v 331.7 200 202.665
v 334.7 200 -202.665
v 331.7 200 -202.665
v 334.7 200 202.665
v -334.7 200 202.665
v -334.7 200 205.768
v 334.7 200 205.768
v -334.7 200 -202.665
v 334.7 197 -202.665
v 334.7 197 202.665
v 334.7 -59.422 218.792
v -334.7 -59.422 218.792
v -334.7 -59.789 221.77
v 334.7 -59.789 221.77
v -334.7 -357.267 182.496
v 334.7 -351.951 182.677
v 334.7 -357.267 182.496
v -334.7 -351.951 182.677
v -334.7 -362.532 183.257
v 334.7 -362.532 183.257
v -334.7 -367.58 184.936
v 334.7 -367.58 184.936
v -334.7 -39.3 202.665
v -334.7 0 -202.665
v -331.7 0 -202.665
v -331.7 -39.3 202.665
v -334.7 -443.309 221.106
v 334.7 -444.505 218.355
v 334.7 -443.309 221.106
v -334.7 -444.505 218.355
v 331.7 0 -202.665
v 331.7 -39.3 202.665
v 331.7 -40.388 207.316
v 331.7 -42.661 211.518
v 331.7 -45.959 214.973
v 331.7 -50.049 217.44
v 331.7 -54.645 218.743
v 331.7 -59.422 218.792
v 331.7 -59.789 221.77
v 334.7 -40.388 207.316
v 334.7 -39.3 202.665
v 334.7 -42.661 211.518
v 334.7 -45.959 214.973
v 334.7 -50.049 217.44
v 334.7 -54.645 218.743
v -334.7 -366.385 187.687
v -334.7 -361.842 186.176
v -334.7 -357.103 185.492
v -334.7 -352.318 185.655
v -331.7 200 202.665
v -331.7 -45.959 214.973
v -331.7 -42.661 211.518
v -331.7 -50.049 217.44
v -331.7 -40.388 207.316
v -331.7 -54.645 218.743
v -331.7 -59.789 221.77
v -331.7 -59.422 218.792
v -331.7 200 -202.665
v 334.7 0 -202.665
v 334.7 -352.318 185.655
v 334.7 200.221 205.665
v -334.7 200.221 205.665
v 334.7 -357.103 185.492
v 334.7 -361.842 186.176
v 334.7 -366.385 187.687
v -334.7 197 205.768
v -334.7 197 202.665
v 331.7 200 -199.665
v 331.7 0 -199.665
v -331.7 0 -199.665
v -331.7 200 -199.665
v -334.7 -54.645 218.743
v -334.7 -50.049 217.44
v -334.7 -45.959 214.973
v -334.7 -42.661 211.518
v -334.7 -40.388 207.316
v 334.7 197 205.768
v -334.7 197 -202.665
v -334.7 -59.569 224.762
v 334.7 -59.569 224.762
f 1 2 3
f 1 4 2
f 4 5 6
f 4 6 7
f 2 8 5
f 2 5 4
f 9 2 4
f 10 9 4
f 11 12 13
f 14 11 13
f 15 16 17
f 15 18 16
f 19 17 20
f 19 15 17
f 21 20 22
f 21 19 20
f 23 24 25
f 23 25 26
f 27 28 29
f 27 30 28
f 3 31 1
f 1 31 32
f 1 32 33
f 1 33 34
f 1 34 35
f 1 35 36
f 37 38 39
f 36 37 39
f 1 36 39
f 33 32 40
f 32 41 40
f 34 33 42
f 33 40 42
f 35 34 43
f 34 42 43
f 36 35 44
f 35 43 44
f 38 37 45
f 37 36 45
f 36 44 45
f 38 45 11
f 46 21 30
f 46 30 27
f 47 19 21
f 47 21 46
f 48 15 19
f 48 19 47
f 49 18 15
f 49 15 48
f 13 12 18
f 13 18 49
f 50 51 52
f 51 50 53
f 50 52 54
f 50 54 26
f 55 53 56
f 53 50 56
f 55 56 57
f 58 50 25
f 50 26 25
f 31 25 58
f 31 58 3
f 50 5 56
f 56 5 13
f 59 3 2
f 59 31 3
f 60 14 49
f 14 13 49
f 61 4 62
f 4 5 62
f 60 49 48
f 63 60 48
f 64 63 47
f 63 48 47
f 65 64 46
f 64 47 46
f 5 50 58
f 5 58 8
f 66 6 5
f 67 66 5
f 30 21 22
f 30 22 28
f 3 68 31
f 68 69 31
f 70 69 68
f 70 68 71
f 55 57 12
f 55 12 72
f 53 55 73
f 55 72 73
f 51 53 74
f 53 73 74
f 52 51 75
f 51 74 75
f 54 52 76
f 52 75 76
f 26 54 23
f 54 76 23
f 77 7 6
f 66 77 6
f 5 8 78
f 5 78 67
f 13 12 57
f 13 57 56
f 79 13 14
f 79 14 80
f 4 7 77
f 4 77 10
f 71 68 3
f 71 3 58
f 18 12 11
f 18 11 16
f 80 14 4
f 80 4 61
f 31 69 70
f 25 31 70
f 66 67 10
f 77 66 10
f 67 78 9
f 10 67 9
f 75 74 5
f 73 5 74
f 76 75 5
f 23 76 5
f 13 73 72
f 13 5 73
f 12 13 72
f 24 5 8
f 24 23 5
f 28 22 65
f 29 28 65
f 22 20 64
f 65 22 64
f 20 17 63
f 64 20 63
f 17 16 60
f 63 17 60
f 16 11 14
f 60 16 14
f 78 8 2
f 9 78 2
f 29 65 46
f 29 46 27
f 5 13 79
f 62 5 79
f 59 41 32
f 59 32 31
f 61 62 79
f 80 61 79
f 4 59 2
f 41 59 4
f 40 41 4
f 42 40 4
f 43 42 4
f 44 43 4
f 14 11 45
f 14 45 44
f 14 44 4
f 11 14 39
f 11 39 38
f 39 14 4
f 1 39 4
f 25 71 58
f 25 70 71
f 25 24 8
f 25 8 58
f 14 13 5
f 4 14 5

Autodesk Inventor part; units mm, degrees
ref_plane "YZ Plane" through (0, 0, 0) normal (1, 0, 0) x (0, 1, 0)
ref_plane "XZ Plane" through (0, 0, 0) normal (0, 1, 0) x (-1, 0, 0)
ref_plane "XY Plane" through (0, 0, 0) normal (0, 0, 1) x (1, 0, 0)
sketch "Sketch1" plane through (0, 0, 0) normal (0, 1, 0) x (-1, 0, 0)
  line L0 (334.7, -202.665) -> (-334.7, -202.665)
  line L1 (-334.7, -202.665) -> (-334.7, 202.665)
  line L2 (-334.7, 202.665) -> (334.7, 202.665)
  line L3 (334.7, 202.665) -> (334.7, -202.665)
  line L4 (337.7, -202.665) -> (-337.7, -202.665) construction
  line L5 (-337.7, -202.665) -> (-337.7, 202.665) construction
  line L6 (-337.7, 202.665) -> (337.7, 202.665) construction
  line L7 (337.7, 202.665) -> (337.7, -202.665) construction
  line L8 (-331.7, 199.665) -> (-331.7, -199.665)
  line L9 (-331.7, -199.665) -> (331.7, -199.665)
  line L10 (331.7, -199.665) -> (331.7, 199.665)
  line L11 (331.7, 199.665) -> (-331.7, 199.665)
  line L12 (331.7, 199.665) -> (331.7, 202.665)
  line L13 (-331.7, 199.665) -> (-331.7, 202.665)
  line L14 (331.7, -199.665) -> (331.7, -202.665)
  line L15 (-331.7, -199.665) -> (-331.7, -202.665)
  point P0 (0, 0)
  point P1 (-334.7, 0)
  point P2 (0, -202.665)
  point P3 (0, -202.665)
  point P4 (-337.7, 0)
  point P5 (331.7, 202.665)
  point P6 (331.7, -202.665)
  point P7 (-331.7, -202.665)
  dimension "d0" = 675.4
  dimension "d1" = 405.33
  dimension "d2" = 3
  dimension "d3" = 3
extrude "Extrusion1" add sketch "Sketch1" along normal blind 200 contours L0 L14 L10 L12 L2 L3
extrude "Extrusion2" add sketch "Sketch1" along normal blind 200 separate body contours L0 L15 L9 L14
sketch "Sketch2" plane through (-334.7, 0, -202.665) normal (-1, 0, 0) x (0, 0, 1)
  line L0 (405.33, 0) -> (0, 0) projected
  line L1 (0, 0) -> (405.33, -39.3)
  line L2 (405.33, 0) -> (405.33, -39.3) construction
  line L3 (405.33, 0) -> (405.33, 200) projected
  arc A0 (421.4573, -59.4215) -> (405.33, -39.3) centre (403.5929, -57.216) ccw
  line L4 (421.4573, -59.4215) -> (413.7818, -121.5922) construction
  line L5 (421.4573, -59.4215) -> (424.4347, -59.7891)
  line L6 (405.33, 200) -> (424.4347, -59.7891)
  point P0 (202.665, 0)
  dimension "d8" = 39.3
  dimension "d9" = 18
  dimension "d10" = 88.5
  dimension "d12" = 3
extrude "Extrusion3" add sketch "Sketch2" against normal up to surface (3 mm away) bodies 1
mirror "Mirror1" about plane through (0, 0, 0) normal (1, 0, 0) of "Extrusion3", "Extrusion1" bodies 1
sketch "Sketch4" plane through (-334.7, 0, -202.665) normal (-1, 0, 0) x (0, 0, 1)
  line L0 (0, 0) -> (405.33, -39.3) projected
  arc A0 (421.4573, -59.4215) -> (405.33, -39.3) centre (403.5929, -57.216) ccw projected
  line L1 (421.4573, -59.4215) -> (424.4347, -59.7891) projected
  line L2 (424.4347, -59.7891) -> (405.33, 200) projected
  line L3 (0, 200) -> (405.33, 200) projected
  line L4 (0, 0) -> (0, 200) projected
  line L5 (424.4347, -59.7891) -> (405.33, 200) projected
  line L6 (405.33, 200) -> (408.33, 200.2206)
  line L7 (408.33, 200.2206) -> (427.4266, -59.569)
  line L8 (424.4347, -59.7891) -> (427.4266, -59.569)
  point P0 (202.665, 0)
  dimension "d15" = 90
  dimension "d16" = 3
  dimension "d17" = 90
  dimension "d19" = 3
extrude "Extrusion4" add sketch "Sketch4" against normal up to surface (669.4 mm away) separate body contours L6 L7 L8 L2
sketch "Sketch5" plane through (0, 200, 0) normal (0, 1, 0) x (1, 0, 0)
  line L0 (-334.7, 202.665) -> (-334.7, -202.665) projected
  line L1 (334.7, -218.9279) -> (334.7, -202.665) projected
  line L2 (-334.7, 202.665) -> (334.7, 202.665)
  line L3 (334.7, 202.665) -> (334.7, -205.7675)
  line L4 (334.7, -205.7675) -> (-334.7, -205.7675)
  line L5 (-334.7, -205.7675) -> (-334.7, 202.665)
  point P0 (0, 0)
  point P1 (334.7, -218.7923)
extrude "Extrusion5" add sketch "Sketch5" against normal blind 3 separate body
sketch "Sketch6" plane through (-334.7, 0, -202.665) normal (-1, 0, 0) x (0, 0, 1)
  arc A0 (421.4573, -59.4215) -> (405.33, -39.3) centre (403.5929, -57.216) ccw projected
  line L0 (421.4573, -59.4215) -> (385.3424, -351.9506)
  arc A1 (421.4573, -59.4215) -> (405.33, -39.3) centre (403.5929, -57.216) ccw projected
  arc A2 (385.3424, -351.9506) -> (387.6008, -367.5802) centre (415.1163, -355.6264) ccw
  line L1 (387.6008, -367.5802) -> (421.0197, -444.5046)
  line L2 (424.4347, -59.7891) -> (388.3198, -352.3182)
  arc A3 (388.3198, -352.3182) -> (390.3523, -366.3849) centre (415.1163, -355.6264) ccw
  line L3 (390.3523, -366.3849) -> (423.7713, -443.3092)
  line L4 (421.4573, -59.4215) -> (424.4347, -59.7891)
  line L5 (421.0197, -444.5046) -> (423.7713, -443.3092)
  point P0 (202.665, 0)
  dimension "d24" = 294.75
  dimension "d25" = 30
  dimension "d26" = 149.48
  dimension "d27" = 83.87
  dimension "d28" = 3
extrude "Extrusion6" add sketch "Sketch6" against normal up to surface (669.4 mm away) separate body
sketch "Sketch7" plane through (-334.7, -59.7891, 221.7697) normal (0, -0.1225, 0.9925) x (1, 0, 0)
  ellipse E0 centre (1026.9236, 18.0035) end of major axis (1999.1461, 18.0035) minor radius 972.2223 (54.8677, 0.0035) -> (106.3768, -294.7427) ccw projected
  spline S0 degree 3 poles (109, -302.3594) (108.5627, -301.1176) (108.1258, -299.8562) (107.2511, -297.3094) (106.8142, -296.0268) (106.3768, -294.7427) knots -0.813889 -0.813889 -0.813889 -0.813889 -0.406945 -0.406945 0 0 0 0 projected
  spline S1 degree 3 poles (112.888, -309.9746) (112.3974, -309.2284) (111.9723, -308.5468) (111.6126, -307.9425) (111.4327, -307.6404) (111.2692, -307.3574) (111.1221, -307.0949) (111.0485, -306.9636) (110.979, -306.8374) (110.9136, -306.7164) (110.8809, -306.6559) (110.8493, -306.5967) (110.8186, -306.5388) (110.8033, -306.5098) (110.7882, -306.4812) (110.7734, -306.4529) (110.766, -306.4387) (110.7586, -306.4247) (110.7514, -306.4107) (110.7441, -306.3967) (110.7375, -306.384) (110.7297, -306.369) (110.2337, -305.4107) (109.6571, -304.0867) (109, -302.3594) knots 0 0 0 0 0.25 0.25 0.25 0.375 0.375 0.375 0.4375 0.4375 0.4375 0.46875 0.46875 0.46875 0.484375 0.484375 0.484375 0.492187 0.492187 0.492187 0.5 0.5 0.5 1 1 1 1 projected
  ellipse E1 centre (138.7441, -291.9833) end of major axis (170.2478, -291.9833) minor radius 31.4913 (112.888, -309.9746) -> (138.7441, -323.4747) ccw projected
  line L0 (138.7441, -323.4747) -> (536.6559, -323.4747) projected
  ellipse E2 centre (138.7441, -291.9833) end of major axis (170.2478, -291.9833) minor radius 31.4913 (112.888, -309.9746) -> (138.7441, -323.4747) ccw projected
  line L1 (138.7441, -323.4747) -> (536.6559, -323.4747) projected
  line L2 (543.4, -374.2271) -> (543.4, -316.9082) projected
  ellipse E3 centre (-351.5236, 18.0035) end of major axis (620.6989, 18.0035) minor radius 972.2223 (569.0232, -294.7427) -> (620.5323, 0.0035) ccw projected
  spline S2 degree 3 poles (569.0232, -294.7427) (568.5858, -296.0268) (568.1489, -297.3094) (567.2742, -299.8562) (566.8373, -301.1176) (566.4, -302.3594) knots -0.813889 -0.813889 -0.813889 -0.813889 -0.406945 -0.406945 0 0 0 0 projected
  ellipse E4 centre (-351.5236, 18.0035) end of major axis (620.6989, 18.0035) minor radius 972.2223 (569.0232, -294.7427) -> (620.5323, 0.0035) ccw projected
  spline S3 degree 3 poles (566.4, -302.3594) (566.0715, -303.2229) (565.7631, -303.9859) (565.3307, -304.986) (565.1916, -305.2952) (564.9904, -305.724) (564.9246, -305.8611) (564.8278, -306.058) (564.7799, -306.1543) (564.7248, -306.2629) (564.7014, -306.3087) (564.6858, -306.339) (564.6774, -306.3552) (564.4415, -306.811) (564.1473, -307.338) (563.4278, -308.5466) (563.0027, -309.2282) (562.512, -309.9746) knots 0 0 0 0 0.25 0.25 0.375 0.375 0.4375 0.4375 0.46875 0.484375 0.492187 0.492187 0.5 0.5 0.75 0.75 1 1 1 1 projected
  ellipse E5 centre (536.6559, -291.9833) end of major axis (568.1595, -291.9833) minor radius 31.4913 (536.6559, -323.4747) -> (562.512, -309.9746) ccw projected
  point P0 (334.7, 32.1657)
sketch "Sketch8" plane through (-334.7, -366.3849, 187.6873) normal (0, 0.3985, 0.9172) x (1, 0, 0)
  line L0 (138.7441, -15.6403) -> (536.6559, -15.6403) projected
  ellipse E0 centre (138.7441, 20.9297) end of major axis (138.7441, 57.4996) minor radius 31.5036 (112.888, 0.037) -> (138.7441, -15.6403) ccw projected
  ellipse E1 centre (536.6559, 20.9297) end of major axis (536.6559, -15.6403) minor radius 31.5036 (536.6559, -15.6403) -> (562.512, 0.037) ccw projected
  spline S0 degree 3 poles (566.4, 8.211) (566.0715, 7.3517) (565.7631, 6.5717) (565.3307, 5.5321) (565.1916, 5.2072) (564.9904, 4.7533) (564.9246, 4.6076) (564.8278, 4.3974) (564.7799, 4.2944) (564.7248, 4.1779) (564.7014, 4.1288) (564.6858, 4.0962) (564.6774, 4.0788) (564.4415, 3.5887) (564.1473, 3.0158) (563.4278, 1.6734) (563.0027, 0.9037) (562.512, 0.037) knots 0 0 0 0 0.25 0.25 0.375 0.375 0.4375 0.4375 0.46875 0.484375 0.492187 0.492187 0.5 0.5 0.75 0.75 1 1 1 1 projected
  spline S1 degree 3 poles (112.888, 0.037) (112.3974, 0.9036) (111.9723, 1.6732) (111.6126, 2.3444) (111.4327, 2.68) (111.2692, 2.991) (111.1221, 3.2776) (111.0485, 3.4209) (110.979, 3.558) (110.9136, 3.6891) (110.8809, 3.7546) (110.8493, 3.8186) (110.8186, 3.8811) (110.8033, 3.9123) (110.7882, 3.9432) (110.7734, 3.9736) (110.766, 3.9889) (110.7586, 4.004) (110.7514, 4.0191) (110.7441, 4.0341) (110.7375, 4.0478) (110.7297, 4.0639) (110.2337, 5.0945) (109.6571, 6.4921) (109, 8.211) knots 0 0 0 0 0.25 0.25 0.25 0.375 0.375 0.375 0.4375 0.4375 0.4375 0.46875 0.46875 0.46875 0.484375 0.484375 0.484375 0.492187 0.492187 0.492187 0.5 0.5 0.5 1 1 1 1 projected
  point P0 (334.7, 410.8289)
properties part number "SigmaxxEnclosure"
